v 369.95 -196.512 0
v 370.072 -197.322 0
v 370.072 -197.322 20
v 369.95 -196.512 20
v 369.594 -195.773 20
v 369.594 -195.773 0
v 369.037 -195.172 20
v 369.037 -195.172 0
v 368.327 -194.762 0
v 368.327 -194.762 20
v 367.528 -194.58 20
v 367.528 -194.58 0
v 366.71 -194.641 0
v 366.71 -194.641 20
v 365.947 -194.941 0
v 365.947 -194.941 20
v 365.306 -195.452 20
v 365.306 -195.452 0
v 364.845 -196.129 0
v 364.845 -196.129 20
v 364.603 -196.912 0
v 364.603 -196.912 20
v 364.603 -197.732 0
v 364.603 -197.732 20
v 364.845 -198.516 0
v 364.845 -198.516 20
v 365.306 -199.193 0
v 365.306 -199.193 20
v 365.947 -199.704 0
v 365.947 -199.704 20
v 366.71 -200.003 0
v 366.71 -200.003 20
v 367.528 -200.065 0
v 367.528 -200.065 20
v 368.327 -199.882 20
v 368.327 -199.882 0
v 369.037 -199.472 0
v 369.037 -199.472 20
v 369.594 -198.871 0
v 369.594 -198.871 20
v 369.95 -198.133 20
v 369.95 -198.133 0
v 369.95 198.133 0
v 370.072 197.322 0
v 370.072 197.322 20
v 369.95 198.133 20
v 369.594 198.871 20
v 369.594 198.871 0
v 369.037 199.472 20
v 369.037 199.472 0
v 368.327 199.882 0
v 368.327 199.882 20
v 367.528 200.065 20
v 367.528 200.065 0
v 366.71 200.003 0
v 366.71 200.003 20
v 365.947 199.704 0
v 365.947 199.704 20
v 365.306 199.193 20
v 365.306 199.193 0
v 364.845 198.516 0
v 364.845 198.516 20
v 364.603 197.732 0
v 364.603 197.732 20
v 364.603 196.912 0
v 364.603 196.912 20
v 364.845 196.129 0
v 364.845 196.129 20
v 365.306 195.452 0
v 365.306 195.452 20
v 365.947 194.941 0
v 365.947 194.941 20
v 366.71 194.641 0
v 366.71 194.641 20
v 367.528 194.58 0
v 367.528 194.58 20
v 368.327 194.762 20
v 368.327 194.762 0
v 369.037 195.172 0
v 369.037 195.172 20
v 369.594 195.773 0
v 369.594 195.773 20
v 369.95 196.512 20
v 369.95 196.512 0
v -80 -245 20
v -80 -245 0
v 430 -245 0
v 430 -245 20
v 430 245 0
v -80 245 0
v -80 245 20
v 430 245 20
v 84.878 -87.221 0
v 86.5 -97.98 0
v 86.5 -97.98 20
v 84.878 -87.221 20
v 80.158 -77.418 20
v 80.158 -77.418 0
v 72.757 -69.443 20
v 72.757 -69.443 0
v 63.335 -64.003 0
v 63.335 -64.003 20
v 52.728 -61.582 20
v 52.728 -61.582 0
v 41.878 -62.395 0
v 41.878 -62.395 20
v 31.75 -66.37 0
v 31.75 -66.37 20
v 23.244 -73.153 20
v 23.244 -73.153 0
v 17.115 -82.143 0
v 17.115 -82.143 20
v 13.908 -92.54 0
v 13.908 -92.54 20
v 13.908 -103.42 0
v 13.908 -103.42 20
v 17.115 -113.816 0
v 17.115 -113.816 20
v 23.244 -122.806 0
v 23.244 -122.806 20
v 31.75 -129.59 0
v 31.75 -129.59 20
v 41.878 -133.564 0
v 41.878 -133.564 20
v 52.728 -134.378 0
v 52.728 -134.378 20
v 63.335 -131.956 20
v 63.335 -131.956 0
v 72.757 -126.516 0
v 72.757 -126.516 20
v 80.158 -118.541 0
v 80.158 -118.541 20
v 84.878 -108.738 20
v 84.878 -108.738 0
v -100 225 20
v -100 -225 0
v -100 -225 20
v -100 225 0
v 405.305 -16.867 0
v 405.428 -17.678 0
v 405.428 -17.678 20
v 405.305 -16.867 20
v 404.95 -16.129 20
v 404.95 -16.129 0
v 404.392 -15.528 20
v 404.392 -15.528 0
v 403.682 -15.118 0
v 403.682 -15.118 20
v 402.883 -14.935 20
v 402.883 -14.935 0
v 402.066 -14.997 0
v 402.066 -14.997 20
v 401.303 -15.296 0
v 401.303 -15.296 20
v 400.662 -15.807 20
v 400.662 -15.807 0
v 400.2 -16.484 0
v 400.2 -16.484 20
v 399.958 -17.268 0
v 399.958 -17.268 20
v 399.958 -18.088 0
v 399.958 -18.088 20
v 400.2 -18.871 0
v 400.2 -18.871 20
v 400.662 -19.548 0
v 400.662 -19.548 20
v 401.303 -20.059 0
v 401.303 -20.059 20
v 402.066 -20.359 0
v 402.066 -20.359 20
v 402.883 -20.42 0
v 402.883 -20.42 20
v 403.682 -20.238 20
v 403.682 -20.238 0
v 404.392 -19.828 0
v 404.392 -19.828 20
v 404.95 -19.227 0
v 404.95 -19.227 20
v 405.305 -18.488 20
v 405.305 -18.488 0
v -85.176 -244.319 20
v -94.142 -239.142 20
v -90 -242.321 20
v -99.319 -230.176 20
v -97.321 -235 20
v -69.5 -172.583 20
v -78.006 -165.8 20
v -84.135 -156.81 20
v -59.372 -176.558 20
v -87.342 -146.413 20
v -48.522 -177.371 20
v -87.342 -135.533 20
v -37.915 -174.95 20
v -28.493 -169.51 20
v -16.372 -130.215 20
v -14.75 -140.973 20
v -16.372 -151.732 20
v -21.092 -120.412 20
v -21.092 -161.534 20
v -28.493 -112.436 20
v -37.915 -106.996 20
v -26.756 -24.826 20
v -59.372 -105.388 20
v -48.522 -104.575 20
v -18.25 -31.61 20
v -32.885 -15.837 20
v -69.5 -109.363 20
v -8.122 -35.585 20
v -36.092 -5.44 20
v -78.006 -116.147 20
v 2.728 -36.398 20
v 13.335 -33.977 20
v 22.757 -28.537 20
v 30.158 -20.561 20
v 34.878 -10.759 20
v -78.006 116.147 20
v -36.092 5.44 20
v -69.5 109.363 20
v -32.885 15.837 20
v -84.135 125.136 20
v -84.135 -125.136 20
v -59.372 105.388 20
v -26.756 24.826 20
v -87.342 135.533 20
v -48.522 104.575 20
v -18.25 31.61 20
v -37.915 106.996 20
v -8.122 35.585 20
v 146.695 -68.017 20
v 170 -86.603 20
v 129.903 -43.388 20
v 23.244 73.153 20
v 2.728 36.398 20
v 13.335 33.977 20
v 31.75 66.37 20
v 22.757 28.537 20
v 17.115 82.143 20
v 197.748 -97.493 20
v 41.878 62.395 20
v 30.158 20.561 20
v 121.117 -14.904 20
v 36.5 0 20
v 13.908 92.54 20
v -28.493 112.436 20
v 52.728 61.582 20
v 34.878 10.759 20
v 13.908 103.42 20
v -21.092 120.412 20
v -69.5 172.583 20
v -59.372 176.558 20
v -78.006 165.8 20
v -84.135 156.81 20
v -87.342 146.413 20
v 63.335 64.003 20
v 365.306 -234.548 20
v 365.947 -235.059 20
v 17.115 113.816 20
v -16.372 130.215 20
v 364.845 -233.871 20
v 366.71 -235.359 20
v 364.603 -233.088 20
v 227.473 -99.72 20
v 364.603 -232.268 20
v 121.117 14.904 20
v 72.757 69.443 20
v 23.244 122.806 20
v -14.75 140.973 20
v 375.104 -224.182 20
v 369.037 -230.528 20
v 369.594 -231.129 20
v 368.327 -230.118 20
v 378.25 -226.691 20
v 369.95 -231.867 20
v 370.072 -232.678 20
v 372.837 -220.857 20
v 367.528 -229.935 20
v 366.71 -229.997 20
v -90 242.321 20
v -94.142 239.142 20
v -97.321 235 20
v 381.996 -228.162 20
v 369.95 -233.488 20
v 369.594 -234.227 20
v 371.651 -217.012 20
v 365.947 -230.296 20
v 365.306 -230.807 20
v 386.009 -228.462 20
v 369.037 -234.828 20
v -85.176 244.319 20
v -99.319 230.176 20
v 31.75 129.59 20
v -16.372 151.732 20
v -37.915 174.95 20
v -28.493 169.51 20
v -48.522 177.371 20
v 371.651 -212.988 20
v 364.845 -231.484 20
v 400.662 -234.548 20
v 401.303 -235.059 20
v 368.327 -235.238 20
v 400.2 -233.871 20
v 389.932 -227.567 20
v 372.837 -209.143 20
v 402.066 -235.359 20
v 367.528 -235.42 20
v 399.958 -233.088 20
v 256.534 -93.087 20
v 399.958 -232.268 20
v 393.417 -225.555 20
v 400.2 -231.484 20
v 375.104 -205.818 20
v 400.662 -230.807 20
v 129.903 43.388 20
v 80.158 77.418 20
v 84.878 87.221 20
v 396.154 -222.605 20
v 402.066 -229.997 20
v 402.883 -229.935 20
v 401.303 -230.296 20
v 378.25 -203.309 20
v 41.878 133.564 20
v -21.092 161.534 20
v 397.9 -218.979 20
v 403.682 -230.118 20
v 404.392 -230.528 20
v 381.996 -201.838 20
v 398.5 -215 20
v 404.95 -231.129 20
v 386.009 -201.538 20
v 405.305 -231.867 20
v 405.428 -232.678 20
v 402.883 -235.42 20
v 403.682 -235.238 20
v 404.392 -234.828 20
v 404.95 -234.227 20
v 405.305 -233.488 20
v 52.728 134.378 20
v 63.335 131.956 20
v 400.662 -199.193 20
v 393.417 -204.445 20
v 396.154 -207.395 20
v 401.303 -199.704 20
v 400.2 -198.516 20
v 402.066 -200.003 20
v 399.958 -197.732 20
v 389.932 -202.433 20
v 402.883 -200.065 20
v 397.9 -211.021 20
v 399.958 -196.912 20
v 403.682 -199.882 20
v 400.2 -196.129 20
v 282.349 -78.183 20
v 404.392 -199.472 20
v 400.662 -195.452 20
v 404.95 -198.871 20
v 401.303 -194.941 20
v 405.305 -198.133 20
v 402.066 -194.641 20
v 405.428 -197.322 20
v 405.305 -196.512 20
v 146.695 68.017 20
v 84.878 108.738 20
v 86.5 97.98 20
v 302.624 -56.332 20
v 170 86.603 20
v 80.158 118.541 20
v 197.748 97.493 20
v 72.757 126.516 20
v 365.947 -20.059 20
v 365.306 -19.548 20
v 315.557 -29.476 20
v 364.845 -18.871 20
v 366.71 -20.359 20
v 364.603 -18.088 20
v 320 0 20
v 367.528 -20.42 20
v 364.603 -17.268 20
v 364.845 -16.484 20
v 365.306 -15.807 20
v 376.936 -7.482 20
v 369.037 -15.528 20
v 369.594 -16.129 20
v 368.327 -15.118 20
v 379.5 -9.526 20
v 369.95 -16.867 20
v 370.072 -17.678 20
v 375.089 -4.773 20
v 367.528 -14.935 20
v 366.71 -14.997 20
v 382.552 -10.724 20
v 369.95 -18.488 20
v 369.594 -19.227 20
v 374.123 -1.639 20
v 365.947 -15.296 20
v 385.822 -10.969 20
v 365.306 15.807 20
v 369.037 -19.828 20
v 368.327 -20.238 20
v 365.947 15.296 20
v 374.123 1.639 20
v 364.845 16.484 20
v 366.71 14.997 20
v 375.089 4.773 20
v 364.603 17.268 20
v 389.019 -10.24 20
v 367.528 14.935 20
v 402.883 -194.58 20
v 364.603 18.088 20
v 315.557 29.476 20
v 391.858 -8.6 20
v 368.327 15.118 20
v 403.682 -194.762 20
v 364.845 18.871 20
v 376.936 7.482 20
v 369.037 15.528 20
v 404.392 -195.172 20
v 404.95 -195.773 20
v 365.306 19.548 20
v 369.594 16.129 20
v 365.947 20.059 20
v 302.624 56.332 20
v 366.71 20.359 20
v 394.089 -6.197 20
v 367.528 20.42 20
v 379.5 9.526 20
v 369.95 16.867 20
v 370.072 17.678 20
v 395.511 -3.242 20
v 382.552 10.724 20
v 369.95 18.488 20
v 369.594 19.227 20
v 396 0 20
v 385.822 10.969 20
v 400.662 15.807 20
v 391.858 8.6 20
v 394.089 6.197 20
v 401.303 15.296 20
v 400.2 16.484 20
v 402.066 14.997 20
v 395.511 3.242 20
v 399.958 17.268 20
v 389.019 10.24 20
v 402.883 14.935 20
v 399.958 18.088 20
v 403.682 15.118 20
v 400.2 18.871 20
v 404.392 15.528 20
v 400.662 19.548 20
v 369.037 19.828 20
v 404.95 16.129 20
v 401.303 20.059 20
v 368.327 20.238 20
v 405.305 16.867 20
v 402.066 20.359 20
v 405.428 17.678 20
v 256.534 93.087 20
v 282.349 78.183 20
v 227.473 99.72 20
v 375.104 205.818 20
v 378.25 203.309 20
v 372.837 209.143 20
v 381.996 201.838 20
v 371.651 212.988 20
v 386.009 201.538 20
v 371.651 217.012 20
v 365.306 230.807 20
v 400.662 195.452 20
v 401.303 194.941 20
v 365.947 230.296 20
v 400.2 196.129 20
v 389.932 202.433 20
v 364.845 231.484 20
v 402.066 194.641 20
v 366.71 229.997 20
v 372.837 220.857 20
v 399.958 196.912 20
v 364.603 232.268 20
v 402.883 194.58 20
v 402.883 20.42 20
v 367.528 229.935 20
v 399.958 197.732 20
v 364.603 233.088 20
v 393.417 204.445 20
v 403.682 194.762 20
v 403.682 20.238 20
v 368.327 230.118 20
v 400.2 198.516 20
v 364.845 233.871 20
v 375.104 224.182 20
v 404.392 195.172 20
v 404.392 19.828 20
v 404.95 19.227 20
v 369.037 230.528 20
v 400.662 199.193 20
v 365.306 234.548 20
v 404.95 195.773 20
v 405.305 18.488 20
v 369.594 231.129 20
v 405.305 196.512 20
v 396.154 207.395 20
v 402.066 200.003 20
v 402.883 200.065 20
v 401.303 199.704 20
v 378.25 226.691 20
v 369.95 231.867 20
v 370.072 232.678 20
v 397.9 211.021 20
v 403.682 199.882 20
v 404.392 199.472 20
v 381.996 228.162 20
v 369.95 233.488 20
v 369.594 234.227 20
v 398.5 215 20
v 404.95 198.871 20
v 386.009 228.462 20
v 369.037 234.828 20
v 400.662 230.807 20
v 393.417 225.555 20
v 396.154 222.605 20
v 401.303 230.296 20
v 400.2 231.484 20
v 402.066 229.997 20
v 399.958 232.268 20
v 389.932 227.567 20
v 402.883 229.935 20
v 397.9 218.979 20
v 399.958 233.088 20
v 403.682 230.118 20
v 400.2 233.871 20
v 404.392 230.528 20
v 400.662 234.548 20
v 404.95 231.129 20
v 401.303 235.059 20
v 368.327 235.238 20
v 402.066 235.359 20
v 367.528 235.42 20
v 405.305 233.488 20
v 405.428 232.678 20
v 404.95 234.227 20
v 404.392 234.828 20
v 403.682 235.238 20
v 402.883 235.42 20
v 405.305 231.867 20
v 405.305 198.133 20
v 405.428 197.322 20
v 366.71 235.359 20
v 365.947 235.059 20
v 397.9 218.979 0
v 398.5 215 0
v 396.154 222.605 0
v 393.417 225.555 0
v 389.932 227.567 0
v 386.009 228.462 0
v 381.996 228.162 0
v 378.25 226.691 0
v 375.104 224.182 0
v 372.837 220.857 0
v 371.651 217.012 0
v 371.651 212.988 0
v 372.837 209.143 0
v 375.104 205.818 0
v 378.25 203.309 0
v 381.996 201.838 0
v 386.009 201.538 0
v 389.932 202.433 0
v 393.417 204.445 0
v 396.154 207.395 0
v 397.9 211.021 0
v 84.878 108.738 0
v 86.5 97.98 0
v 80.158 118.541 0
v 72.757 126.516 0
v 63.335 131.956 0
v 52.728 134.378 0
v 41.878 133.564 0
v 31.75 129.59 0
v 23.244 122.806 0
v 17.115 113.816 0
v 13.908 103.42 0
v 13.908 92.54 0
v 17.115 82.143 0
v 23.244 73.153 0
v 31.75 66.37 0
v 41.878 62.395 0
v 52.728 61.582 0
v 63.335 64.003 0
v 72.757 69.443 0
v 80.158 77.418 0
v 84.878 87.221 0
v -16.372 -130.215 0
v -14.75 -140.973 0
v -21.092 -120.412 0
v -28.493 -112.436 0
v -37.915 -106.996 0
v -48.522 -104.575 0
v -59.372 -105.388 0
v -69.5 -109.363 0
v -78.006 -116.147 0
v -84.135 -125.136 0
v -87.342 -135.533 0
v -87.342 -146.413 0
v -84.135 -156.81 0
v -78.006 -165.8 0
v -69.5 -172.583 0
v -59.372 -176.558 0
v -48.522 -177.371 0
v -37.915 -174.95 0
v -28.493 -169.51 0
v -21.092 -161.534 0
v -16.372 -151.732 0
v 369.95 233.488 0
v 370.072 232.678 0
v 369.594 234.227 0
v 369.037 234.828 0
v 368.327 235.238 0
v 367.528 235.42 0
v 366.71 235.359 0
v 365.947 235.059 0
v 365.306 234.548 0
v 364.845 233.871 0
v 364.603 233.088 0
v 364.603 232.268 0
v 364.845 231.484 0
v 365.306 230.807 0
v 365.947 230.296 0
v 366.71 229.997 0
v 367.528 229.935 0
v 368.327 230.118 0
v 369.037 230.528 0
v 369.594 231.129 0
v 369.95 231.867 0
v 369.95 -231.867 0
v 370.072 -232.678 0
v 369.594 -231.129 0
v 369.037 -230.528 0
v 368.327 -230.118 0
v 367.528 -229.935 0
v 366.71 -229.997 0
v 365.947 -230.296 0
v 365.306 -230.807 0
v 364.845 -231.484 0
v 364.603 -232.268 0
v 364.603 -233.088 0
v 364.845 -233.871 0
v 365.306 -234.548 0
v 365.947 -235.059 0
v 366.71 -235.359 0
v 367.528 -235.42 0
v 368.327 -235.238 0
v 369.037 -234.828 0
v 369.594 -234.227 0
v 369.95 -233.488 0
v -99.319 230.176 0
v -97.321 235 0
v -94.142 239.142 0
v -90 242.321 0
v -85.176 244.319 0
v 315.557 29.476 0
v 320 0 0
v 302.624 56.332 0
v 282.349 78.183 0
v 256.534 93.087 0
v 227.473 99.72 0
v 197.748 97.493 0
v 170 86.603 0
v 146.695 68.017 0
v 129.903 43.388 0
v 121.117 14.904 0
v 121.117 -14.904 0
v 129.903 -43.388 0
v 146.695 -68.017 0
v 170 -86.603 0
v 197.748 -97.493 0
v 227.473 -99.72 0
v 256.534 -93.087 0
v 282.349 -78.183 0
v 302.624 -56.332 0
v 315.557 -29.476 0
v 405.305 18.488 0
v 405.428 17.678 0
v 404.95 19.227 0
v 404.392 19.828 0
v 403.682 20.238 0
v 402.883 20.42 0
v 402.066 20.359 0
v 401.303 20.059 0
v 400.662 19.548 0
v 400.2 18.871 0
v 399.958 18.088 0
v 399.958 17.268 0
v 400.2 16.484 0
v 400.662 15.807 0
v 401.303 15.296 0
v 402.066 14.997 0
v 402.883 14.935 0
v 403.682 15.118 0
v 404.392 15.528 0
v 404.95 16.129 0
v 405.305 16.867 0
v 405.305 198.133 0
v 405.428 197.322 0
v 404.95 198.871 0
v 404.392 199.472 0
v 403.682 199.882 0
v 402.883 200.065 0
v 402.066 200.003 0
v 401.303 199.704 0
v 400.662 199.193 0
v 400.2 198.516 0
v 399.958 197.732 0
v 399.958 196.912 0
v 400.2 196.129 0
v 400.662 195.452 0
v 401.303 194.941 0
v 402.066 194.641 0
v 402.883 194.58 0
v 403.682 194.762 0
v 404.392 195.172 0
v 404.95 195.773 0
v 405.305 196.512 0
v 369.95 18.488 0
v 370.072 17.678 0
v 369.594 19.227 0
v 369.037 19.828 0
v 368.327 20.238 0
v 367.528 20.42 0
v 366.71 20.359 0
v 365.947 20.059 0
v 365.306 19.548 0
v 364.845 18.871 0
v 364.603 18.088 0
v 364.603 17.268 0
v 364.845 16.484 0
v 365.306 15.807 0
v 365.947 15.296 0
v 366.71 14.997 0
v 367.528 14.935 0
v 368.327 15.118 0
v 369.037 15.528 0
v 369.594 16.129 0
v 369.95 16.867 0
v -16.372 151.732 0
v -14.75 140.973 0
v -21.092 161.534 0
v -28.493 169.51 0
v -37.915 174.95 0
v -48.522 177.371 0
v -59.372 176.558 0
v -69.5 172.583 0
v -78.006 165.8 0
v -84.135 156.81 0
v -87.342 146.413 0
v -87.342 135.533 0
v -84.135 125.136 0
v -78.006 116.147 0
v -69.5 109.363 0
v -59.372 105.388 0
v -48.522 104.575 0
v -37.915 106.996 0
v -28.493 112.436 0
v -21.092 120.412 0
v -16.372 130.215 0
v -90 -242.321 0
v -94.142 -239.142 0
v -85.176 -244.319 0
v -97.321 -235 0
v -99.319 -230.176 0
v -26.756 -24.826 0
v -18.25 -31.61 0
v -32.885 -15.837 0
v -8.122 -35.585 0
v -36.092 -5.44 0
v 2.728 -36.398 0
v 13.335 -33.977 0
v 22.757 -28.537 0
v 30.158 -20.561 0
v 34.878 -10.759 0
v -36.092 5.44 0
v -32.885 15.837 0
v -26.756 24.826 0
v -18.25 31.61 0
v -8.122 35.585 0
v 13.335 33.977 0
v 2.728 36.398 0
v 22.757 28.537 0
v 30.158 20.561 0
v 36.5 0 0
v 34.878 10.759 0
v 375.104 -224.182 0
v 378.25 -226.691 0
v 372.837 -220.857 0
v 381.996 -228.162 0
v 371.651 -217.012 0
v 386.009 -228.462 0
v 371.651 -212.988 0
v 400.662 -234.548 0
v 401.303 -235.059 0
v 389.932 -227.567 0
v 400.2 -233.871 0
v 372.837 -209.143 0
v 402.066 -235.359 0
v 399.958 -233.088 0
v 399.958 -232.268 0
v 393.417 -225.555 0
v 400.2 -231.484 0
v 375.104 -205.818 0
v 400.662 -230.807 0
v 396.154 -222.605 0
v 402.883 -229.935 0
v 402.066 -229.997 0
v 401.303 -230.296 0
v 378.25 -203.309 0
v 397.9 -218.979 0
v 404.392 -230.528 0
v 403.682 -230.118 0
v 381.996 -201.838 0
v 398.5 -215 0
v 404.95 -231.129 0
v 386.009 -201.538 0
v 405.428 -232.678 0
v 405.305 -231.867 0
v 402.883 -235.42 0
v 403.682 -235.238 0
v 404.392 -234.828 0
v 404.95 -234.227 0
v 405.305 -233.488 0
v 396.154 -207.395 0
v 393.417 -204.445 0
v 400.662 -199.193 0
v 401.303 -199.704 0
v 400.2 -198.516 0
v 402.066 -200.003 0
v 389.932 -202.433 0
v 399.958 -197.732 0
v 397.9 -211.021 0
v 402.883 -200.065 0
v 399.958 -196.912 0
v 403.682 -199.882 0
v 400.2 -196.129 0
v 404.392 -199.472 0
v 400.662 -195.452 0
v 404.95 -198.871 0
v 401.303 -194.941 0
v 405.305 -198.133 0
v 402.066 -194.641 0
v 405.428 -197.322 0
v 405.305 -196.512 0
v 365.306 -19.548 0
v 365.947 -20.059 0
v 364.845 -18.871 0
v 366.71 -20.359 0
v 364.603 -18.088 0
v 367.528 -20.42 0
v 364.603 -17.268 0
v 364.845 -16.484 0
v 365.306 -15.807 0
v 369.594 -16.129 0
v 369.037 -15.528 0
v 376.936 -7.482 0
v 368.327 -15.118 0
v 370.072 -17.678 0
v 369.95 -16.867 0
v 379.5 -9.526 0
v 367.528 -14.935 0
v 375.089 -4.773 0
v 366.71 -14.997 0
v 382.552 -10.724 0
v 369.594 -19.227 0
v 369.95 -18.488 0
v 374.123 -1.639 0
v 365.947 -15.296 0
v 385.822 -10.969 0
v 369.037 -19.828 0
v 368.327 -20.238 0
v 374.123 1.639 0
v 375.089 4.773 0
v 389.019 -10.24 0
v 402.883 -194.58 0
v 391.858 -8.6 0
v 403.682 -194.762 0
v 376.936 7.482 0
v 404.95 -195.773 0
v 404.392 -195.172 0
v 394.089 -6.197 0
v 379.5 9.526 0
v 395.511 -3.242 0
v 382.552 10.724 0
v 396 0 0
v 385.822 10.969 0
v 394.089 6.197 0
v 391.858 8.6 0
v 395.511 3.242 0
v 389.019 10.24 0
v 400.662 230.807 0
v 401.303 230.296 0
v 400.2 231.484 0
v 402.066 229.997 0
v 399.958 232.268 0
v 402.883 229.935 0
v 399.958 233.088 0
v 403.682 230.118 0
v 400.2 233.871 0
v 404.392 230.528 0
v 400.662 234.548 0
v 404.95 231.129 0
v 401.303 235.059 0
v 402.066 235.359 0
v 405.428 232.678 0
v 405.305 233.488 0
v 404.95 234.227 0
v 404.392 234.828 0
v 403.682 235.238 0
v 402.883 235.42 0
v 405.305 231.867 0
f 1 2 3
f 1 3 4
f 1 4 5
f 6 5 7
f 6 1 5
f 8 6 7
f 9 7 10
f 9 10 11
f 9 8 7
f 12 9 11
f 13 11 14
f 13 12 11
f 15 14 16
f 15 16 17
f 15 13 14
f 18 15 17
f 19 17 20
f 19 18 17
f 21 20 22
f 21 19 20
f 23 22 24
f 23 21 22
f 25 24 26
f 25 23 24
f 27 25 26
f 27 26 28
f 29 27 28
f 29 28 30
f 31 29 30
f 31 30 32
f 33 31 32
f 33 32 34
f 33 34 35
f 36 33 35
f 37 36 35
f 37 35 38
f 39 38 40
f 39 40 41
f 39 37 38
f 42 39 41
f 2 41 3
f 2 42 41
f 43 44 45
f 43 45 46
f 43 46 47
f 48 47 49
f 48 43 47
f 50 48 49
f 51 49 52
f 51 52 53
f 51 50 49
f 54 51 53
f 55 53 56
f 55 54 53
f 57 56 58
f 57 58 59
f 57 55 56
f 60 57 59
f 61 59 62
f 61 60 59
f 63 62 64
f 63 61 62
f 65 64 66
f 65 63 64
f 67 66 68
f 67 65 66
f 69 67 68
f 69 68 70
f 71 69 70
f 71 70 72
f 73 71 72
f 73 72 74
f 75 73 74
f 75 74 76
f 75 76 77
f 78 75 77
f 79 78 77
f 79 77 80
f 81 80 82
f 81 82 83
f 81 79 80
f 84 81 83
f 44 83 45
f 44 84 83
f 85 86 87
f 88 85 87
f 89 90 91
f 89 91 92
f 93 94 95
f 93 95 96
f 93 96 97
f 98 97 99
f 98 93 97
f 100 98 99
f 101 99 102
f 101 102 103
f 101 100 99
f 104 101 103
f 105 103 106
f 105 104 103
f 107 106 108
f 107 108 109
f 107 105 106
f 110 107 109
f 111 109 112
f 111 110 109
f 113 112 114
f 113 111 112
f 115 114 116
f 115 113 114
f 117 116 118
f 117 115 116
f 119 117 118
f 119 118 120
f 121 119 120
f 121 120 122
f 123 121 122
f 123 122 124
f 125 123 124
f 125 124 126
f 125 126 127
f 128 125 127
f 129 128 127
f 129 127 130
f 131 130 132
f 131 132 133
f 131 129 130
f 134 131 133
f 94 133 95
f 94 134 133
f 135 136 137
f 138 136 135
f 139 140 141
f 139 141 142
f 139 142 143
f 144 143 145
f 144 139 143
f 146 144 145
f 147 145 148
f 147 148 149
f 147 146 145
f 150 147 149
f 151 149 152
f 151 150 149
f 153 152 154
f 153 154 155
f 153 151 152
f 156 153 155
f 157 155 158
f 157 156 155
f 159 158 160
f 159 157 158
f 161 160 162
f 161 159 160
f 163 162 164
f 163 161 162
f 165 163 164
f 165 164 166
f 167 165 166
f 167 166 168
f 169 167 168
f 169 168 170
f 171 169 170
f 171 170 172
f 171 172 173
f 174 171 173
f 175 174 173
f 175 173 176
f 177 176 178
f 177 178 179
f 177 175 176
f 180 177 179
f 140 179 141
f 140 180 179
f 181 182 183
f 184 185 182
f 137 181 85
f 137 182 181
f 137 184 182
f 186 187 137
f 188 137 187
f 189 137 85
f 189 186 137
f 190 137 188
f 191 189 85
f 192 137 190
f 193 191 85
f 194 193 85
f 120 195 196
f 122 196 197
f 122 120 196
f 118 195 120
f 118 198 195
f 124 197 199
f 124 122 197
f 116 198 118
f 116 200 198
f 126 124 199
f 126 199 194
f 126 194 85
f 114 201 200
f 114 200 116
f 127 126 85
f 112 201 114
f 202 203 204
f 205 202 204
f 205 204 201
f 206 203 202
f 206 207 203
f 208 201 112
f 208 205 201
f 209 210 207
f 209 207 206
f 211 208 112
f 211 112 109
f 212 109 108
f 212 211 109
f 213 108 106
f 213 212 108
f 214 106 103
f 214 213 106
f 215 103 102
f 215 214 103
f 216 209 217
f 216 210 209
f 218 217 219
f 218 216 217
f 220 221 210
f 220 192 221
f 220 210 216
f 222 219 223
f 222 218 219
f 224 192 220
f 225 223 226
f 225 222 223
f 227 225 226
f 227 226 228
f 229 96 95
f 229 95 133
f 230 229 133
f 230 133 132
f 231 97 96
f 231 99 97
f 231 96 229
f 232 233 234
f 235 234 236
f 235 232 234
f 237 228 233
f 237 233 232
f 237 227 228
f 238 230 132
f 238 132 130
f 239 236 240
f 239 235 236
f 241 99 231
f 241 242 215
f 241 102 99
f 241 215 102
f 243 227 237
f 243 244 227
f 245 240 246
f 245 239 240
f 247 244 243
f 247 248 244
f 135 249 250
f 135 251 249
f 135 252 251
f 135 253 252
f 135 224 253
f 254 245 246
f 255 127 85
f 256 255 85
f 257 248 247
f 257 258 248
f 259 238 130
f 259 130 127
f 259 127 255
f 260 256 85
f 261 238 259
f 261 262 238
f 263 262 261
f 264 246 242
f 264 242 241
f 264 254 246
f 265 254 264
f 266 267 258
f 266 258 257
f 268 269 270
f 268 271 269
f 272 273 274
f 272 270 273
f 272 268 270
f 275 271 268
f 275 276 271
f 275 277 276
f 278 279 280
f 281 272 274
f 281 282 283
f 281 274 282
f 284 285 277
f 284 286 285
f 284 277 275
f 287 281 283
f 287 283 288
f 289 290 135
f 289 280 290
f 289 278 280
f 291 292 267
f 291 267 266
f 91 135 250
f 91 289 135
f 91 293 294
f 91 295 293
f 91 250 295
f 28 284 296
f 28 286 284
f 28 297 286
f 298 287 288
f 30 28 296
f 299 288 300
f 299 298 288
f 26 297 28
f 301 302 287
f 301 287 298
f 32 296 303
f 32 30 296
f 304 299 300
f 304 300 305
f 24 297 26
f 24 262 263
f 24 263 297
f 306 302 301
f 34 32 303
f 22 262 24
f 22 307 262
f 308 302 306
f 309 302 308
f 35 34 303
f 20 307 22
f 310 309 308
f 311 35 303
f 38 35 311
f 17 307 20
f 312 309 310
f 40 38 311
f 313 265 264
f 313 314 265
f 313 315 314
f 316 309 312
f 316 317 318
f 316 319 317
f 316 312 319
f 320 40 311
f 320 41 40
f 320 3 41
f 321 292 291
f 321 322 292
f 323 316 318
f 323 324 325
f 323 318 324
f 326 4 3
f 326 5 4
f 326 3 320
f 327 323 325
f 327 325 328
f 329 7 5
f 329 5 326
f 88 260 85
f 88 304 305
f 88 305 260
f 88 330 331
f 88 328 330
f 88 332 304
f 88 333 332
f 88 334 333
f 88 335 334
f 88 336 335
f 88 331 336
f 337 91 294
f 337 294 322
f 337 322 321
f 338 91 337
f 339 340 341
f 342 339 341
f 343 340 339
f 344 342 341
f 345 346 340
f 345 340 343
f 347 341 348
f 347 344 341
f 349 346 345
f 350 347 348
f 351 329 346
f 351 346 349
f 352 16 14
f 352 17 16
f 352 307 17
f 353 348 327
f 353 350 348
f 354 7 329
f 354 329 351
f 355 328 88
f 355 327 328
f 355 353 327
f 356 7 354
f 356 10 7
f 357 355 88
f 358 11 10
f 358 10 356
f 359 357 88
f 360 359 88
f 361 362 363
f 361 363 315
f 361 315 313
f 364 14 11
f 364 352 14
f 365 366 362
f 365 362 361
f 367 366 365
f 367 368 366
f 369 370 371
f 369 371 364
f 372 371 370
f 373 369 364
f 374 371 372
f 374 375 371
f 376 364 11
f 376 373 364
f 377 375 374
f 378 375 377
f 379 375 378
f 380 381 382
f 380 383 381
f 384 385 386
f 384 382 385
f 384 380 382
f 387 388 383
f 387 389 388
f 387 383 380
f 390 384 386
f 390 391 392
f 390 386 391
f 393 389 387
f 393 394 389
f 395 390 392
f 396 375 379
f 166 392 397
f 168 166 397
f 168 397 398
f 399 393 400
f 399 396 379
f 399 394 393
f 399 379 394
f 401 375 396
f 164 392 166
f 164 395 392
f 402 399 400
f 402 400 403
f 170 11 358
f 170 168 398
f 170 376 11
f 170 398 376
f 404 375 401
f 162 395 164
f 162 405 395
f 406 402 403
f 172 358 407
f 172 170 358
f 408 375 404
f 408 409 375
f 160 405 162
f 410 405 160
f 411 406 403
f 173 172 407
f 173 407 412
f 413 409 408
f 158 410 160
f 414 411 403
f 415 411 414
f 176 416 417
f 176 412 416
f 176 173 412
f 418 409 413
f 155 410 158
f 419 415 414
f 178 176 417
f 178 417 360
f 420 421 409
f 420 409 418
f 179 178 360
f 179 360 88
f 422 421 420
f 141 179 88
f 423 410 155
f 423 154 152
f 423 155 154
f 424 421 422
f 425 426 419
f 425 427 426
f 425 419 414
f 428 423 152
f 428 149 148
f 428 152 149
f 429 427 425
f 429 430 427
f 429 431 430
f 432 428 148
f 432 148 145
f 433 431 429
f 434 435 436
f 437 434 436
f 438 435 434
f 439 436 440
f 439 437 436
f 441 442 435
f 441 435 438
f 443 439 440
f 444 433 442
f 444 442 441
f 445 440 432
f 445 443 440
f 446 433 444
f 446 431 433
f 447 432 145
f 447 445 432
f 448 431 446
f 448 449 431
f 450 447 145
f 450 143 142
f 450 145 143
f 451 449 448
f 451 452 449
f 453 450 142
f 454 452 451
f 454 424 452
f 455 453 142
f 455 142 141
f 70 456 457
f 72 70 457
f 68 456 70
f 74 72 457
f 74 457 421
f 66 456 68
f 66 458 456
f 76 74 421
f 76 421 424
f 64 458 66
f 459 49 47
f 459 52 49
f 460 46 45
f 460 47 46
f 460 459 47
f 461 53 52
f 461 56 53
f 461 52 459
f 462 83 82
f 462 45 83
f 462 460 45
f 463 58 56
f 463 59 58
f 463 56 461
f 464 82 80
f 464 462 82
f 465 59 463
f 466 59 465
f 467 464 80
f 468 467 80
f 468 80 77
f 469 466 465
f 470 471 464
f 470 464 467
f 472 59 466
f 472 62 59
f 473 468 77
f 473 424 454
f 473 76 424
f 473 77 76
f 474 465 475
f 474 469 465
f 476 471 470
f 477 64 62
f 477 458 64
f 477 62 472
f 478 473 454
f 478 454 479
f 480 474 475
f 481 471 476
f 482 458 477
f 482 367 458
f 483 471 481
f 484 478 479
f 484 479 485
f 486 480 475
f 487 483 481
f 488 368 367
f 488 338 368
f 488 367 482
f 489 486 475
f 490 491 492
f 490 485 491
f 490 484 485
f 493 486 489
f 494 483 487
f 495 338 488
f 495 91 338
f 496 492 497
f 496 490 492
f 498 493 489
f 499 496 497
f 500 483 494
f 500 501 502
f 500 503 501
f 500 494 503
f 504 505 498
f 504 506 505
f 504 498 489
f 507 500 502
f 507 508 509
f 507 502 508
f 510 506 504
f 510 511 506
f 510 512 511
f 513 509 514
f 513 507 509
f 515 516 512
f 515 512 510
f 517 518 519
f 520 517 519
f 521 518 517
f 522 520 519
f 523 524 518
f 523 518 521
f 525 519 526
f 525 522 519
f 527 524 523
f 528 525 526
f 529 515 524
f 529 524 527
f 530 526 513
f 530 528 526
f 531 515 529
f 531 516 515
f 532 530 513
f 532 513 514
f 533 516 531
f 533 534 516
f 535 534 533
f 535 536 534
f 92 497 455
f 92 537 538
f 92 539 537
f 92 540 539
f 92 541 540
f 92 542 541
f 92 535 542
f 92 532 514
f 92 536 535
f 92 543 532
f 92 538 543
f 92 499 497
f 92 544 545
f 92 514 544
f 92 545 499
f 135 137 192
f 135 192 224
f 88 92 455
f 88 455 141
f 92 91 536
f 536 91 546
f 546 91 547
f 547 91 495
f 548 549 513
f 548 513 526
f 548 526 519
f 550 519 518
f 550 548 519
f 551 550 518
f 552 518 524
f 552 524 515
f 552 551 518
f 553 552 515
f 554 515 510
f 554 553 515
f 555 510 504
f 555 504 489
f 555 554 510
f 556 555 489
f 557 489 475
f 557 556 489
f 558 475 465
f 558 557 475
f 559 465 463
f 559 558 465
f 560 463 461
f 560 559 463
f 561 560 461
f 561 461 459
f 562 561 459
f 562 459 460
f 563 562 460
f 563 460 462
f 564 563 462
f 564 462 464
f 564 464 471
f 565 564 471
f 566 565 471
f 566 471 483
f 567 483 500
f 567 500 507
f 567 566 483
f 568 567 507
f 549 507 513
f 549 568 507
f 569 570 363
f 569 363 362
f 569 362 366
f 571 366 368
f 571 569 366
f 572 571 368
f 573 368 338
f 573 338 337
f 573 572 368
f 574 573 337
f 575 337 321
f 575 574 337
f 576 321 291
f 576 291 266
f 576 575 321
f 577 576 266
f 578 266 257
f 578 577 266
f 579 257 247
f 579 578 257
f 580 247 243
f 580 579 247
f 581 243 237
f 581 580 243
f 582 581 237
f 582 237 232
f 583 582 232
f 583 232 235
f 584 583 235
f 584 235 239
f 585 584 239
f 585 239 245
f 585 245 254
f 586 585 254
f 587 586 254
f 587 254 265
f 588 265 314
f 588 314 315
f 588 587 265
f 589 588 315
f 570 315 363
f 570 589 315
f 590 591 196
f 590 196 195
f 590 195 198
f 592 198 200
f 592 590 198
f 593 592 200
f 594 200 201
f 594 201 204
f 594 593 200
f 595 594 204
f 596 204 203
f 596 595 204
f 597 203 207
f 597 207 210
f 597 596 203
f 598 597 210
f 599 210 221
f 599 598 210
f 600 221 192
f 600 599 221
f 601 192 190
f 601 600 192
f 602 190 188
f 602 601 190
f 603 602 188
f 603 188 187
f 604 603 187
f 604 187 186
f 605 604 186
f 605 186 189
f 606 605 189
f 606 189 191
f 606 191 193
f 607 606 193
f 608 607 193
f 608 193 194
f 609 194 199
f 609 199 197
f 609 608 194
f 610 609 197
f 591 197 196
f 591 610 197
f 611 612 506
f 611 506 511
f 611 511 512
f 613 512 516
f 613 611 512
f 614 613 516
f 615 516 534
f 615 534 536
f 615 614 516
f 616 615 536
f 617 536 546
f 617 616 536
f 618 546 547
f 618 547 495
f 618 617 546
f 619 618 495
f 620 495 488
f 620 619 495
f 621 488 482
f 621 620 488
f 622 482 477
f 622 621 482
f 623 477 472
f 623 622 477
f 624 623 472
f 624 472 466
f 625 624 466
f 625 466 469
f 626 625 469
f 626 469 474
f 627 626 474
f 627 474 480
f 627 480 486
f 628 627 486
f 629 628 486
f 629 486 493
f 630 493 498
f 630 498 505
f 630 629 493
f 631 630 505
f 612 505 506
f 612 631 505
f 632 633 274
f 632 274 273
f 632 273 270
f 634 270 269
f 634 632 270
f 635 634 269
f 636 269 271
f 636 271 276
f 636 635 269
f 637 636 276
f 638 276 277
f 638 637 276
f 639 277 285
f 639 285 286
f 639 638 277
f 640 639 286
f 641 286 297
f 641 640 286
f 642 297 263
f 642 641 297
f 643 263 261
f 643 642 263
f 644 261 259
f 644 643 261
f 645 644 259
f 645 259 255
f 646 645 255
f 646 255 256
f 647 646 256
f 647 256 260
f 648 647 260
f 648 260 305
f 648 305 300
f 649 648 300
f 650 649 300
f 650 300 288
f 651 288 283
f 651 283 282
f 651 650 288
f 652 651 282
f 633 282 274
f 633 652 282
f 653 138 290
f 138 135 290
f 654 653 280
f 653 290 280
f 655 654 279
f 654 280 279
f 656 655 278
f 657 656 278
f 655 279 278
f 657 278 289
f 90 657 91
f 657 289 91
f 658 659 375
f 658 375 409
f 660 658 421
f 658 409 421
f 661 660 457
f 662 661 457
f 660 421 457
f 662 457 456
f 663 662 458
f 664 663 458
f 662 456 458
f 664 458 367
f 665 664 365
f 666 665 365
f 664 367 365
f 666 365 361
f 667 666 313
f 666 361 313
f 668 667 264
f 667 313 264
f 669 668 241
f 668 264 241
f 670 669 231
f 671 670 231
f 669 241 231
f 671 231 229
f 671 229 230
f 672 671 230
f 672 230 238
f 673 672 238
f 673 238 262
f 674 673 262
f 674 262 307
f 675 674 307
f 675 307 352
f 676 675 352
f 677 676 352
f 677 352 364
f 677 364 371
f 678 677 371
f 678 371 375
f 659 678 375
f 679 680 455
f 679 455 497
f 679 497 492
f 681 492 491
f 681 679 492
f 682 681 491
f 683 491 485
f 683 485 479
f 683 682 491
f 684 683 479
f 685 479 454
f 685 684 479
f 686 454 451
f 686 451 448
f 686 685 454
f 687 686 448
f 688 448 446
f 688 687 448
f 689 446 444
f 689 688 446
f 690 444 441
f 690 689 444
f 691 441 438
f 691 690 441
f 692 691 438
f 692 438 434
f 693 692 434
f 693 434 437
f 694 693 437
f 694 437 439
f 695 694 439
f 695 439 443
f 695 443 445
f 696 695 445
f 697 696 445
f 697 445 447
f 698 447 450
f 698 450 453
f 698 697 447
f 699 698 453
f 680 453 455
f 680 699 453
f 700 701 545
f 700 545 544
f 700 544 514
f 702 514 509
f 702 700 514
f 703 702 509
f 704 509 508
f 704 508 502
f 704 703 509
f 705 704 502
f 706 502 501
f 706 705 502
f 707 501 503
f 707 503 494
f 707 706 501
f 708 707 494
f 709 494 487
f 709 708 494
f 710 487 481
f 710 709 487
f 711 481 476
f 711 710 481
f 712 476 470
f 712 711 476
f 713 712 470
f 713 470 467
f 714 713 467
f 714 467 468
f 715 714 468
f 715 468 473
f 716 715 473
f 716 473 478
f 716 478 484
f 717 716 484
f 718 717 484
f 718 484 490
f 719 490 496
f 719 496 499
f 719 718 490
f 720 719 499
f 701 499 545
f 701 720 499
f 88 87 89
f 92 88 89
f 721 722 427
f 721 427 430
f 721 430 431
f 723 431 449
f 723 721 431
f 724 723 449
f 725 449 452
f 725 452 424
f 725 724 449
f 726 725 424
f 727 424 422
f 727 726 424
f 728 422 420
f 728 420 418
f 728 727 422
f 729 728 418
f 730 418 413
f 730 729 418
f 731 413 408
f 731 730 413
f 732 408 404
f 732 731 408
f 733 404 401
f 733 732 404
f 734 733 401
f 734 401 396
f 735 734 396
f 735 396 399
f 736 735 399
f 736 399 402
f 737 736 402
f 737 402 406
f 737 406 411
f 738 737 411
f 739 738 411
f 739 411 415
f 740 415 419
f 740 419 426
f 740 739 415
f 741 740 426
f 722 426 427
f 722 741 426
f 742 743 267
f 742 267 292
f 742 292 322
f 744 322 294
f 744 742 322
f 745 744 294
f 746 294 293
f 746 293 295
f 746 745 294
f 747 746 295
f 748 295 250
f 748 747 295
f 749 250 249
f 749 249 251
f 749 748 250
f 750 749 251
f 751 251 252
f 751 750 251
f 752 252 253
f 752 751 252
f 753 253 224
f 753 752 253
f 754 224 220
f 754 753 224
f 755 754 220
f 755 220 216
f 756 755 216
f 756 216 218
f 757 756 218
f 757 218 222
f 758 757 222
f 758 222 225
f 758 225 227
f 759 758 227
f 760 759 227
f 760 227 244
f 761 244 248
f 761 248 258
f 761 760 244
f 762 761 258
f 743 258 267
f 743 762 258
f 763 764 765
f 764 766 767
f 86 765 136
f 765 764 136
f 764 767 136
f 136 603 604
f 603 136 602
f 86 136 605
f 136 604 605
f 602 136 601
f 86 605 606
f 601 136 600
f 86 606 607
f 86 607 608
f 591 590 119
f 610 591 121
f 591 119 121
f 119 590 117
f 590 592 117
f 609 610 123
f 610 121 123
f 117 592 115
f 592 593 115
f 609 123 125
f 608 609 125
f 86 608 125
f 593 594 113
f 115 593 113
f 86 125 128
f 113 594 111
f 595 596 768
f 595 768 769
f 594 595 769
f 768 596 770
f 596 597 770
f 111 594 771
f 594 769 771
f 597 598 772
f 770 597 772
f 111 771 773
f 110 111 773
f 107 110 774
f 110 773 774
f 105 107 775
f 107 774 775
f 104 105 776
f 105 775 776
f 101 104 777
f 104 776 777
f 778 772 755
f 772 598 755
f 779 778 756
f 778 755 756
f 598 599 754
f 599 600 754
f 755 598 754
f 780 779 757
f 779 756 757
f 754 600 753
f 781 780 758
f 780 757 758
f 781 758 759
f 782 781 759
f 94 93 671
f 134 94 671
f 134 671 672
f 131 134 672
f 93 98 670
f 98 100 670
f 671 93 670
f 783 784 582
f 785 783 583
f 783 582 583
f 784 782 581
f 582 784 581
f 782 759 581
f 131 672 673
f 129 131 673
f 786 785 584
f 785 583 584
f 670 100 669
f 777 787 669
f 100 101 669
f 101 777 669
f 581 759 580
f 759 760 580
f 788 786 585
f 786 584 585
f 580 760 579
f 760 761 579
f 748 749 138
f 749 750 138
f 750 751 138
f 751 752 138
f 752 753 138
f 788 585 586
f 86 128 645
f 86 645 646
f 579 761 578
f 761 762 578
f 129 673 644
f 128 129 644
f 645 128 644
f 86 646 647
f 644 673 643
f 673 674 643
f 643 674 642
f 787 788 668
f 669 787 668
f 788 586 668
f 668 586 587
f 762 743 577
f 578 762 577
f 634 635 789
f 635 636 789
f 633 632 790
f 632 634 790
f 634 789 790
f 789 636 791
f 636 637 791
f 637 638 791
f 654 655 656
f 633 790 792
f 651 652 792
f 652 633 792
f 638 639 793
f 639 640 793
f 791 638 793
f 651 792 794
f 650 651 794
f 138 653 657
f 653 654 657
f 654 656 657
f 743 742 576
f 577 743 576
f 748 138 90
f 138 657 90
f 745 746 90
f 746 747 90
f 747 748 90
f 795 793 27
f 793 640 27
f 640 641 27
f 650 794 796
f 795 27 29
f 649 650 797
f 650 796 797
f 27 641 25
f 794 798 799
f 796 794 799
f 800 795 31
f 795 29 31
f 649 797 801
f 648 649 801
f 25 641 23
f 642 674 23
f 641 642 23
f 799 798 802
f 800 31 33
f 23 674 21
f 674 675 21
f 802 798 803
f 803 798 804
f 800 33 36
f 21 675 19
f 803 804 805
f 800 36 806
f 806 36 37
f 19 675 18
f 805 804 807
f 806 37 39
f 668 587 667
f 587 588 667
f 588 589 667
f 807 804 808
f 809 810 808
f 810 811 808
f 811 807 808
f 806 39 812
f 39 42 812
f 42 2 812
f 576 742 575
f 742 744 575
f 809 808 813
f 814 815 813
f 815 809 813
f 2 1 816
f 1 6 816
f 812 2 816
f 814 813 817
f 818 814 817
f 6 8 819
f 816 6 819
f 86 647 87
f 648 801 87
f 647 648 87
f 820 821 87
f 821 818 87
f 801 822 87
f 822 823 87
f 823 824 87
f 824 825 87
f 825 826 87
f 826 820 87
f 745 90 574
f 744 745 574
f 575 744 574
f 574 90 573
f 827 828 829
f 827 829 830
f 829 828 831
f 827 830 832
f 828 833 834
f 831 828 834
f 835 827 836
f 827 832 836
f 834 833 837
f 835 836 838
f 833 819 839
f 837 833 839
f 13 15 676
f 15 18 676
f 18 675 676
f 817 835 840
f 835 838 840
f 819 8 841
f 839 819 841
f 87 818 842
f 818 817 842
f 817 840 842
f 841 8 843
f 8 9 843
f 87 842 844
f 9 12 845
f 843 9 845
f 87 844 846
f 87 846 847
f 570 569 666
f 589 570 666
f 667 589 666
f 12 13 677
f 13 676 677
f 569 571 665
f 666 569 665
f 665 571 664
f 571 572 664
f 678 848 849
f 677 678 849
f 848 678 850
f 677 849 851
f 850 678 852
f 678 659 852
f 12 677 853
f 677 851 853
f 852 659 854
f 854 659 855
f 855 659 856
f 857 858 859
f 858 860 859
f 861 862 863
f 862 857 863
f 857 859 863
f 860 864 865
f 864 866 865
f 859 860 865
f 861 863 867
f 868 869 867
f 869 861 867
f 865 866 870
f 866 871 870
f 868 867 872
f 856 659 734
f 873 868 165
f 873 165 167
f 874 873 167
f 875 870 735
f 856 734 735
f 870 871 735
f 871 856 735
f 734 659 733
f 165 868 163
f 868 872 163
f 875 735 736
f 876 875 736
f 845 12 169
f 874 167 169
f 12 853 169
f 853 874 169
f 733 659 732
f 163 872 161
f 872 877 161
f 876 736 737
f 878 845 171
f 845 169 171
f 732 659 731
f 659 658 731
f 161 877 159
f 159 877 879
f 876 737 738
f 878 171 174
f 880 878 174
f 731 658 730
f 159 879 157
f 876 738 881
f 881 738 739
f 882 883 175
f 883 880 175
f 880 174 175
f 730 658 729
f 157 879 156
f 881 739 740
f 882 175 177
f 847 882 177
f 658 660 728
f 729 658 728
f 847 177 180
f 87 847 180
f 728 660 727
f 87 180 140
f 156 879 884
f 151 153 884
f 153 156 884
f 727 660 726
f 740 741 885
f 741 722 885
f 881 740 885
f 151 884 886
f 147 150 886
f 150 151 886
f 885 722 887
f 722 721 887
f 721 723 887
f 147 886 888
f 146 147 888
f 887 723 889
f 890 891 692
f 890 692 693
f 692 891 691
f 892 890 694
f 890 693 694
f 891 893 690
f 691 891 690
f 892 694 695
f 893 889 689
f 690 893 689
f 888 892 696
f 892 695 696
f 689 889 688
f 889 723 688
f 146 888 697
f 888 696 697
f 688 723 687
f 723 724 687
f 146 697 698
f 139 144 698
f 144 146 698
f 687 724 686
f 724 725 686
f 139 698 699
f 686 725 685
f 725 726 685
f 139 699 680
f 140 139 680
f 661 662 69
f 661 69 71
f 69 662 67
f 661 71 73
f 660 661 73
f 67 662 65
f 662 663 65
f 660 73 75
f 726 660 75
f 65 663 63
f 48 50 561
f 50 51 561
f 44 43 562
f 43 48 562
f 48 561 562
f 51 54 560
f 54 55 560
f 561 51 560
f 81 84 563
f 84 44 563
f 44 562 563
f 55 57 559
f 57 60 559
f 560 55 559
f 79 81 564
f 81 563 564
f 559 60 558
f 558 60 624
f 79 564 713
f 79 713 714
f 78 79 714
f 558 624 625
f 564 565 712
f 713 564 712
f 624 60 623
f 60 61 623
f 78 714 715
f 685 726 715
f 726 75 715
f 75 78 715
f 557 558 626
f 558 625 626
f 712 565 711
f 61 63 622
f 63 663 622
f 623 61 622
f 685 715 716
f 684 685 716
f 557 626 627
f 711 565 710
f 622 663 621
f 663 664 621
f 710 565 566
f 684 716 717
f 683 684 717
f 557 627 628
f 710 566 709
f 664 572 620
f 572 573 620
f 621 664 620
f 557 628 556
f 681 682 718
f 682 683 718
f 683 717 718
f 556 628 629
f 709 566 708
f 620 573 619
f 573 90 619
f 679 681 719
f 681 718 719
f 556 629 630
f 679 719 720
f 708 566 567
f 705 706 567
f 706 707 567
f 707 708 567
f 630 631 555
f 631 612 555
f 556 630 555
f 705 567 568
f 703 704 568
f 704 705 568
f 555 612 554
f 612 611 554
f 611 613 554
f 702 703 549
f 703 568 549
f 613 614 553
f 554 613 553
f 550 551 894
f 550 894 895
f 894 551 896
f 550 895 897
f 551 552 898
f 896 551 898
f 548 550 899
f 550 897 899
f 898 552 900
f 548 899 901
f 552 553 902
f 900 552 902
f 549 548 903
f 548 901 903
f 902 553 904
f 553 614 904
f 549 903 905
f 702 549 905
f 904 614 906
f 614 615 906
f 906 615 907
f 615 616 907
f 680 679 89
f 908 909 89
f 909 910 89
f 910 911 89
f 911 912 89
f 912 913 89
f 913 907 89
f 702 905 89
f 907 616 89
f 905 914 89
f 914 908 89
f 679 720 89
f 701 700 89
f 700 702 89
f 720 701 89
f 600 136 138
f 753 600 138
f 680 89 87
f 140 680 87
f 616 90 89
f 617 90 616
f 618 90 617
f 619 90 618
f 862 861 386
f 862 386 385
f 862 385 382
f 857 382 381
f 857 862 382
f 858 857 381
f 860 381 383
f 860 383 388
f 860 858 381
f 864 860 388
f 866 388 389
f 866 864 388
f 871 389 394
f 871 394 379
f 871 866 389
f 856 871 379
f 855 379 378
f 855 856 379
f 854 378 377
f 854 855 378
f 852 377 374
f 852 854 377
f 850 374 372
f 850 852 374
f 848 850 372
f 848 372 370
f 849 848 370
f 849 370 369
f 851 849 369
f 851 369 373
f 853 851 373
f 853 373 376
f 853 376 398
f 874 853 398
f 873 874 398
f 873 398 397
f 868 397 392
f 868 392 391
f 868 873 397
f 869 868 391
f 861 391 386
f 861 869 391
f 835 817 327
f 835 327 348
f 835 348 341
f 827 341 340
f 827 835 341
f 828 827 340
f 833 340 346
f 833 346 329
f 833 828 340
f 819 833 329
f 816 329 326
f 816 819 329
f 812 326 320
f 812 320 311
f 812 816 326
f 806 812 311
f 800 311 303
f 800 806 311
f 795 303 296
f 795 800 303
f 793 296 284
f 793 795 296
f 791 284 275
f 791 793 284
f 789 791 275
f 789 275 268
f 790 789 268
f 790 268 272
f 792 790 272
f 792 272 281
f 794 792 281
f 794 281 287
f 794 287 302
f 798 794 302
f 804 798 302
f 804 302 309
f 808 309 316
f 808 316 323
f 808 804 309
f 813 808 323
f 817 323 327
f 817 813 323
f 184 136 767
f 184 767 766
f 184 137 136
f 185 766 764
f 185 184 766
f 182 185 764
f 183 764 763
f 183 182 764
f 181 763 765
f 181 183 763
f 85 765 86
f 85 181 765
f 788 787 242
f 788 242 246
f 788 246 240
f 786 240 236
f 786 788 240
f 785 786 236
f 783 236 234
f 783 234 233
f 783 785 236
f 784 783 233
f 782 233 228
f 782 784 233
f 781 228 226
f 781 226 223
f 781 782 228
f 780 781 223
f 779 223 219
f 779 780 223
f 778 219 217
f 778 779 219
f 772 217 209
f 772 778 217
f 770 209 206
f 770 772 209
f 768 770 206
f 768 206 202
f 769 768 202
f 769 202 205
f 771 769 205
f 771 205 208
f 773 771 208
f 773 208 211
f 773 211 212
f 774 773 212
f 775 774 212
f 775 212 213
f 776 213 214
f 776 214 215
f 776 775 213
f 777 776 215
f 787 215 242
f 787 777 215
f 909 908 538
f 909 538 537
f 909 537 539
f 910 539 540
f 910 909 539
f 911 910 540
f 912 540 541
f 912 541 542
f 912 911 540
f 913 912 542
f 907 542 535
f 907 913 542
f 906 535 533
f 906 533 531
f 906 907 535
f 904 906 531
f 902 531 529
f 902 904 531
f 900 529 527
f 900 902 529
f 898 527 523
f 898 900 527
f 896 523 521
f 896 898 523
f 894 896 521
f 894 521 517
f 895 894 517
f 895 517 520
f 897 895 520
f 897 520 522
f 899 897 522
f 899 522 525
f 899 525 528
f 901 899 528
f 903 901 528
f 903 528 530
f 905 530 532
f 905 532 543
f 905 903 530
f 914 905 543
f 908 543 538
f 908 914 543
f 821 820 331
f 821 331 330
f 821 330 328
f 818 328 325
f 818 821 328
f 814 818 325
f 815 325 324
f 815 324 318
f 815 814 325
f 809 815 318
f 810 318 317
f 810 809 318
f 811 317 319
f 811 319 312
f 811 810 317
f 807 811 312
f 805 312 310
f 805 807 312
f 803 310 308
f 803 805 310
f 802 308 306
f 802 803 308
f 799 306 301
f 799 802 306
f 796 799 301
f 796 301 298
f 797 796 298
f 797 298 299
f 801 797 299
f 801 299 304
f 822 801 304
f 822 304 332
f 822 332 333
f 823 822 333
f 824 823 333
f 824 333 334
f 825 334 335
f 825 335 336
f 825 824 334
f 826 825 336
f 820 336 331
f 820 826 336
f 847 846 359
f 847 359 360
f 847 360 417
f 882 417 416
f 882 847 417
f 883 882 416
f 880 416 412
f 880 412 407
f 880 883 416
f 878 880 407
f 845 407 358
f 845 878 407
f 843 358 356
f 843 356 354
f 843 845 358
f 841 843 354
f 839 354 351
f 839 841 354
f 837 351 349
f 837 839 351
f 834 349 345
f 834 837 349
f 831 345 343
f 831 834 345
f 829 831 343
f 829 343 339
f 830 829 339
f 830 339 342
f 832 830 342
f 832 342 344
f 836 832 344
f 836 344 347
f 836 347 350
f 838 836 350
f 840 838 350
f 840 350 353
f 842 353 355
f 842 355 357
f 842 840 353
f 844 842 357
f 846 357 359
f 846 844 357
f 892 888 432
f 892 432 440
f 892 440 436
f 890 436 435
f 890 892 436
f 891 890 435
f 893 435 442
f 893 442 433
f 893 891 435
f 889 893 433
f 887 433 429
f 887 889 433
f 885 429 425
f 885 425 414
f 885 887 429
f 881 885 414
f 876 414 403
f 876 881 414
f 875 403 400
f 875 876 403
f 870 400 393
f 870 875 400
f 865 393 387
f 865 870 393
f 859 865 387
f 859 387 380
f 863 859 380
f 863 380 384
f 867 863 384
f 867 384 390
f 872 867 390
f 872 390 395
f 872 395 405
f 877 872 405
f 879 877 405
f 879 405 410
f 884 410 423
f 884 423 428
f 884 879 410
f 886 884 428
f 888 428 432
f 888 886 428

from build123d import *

# Parameters (mm, degrees)
SKETCH_1_W          = 530
SKETCH_1_H          = 490
SKETCH_1_R          = 36.5
SKETCH_1_R_2        = 2.75
SKETCH_1_R_3        = 13.5
SKETCH_1_R_4        = 11
EXTRUDE_1_DEPTH     = 20
FILLET_1_R          = 20
SKETCH_2_R          = 100
CUT_EXTRUDE_1_DEPTH = 496.302937605


with BuildPart() as part:
    # Эскиз1 → Бобышка-Вытянуть1 (new body)
    with BuildSketch(Plane.XY):
        with Locations((165, 0)):
            Rectangle(SKETCH_1_W, SKETCH_1_H)
        with Locations((-51.249933939, -140.973204089)):
            Circle(SKETCH_1_R, mode=Mode.SUBTRACT)
        with Locations((50, -97.979589711)):
            Circle(SKETCH_1_R, mode=Mode.SUBTRACT)
        with Locations((367.32233047, -232.67766953)):
            Circle(SKETCH_1_R_2, mode=Mode.SUBTRACT)
        with Locations((385, -215)):
            Circle(SKETCH_1_R_3, mode=Mode.SUBTRACT)
        with Locations((402.67766953, -232.67766953)):
            Circle(SKETCH_1_R_2, mode=Mode.SUBTRACT)
        with Locations((367.32233047, -197.32233047)):
            Circle(SKETCH_1_R_2, mode=Mode.SUBTRACT)
        with Locations((402.67766953, -197.32233047)):
            Circle(SKETCH_1_R_2, mode=Mode.SUBTRACT)
        with Locations((367.32233047, -17.67766953)):
            Circle(SKETCH_1_R_2, mode=Mode.SUBTRACT)
        with Locations((402.67766953, -17.67766953)):
            Circle(SKETCH_1_R_2, mode=Mode.SUBTRACT)
        Circle(SKETCH_1_R, mode=Mode.SUBTRACT)
        with Locations((50, 97.979589711)):
            Circle(SKETCH_1_R, mode=Mode.SUBTRACT)
        with Locations((-51.249933939, 140.973204089)):
            Circle(SKETCH_1_R, mode=Mode.SUBTRACT)
        with Locations((385, 0)):
            Circle(SKETCH_1_R_4, mode=Mode.SUBTRACT)
        with Locations((367.32233047, 17.67766953)):
            Circle(SKETCH_1_R_2, mode=Mode.SUBTRACT)
        with Locations((402.67766953, 17.67766953)):
            Circle(SKETCH_1_R_2, mode=Mode.SUBTRACT)
        with Locations((367.32233047, 197.32233047)):
            Circle(SKETCH_1_R_2, mode=Mode.SUBTRACT)
        with Locations((402.67766953, 197.32233047)):
            Circle(SKETCH_1_R_2, mode=Mode.SUBTRACT)
        with Locations((385, 215)):
            Circle(SKETCH_1_R_3, mode=Mode.SUBTRACT)
        with Locations((367.32233047, 232.67766953)):
            Circle(SKETCH_1_R_2, mode=Mode.SUBTRACT)
        with Locations((402.67766953, 232.67766953)):
            Circle(SKETCH_1_R_2, mode=Mode.SUBTRACT)
    extrude(amount=EXTRUDE_1_DEPTH)

    # Скругление1
    fillet_1_edges = [part.edges().sort_by_distance(p)[0] for p in [
        (-100, 245, 10),
        (-100, -245, 10),
    ]]
    fillet(fillet_1_edges, radius=FILLET_1_R)

    # Эскиз2 → Вырез-Вытянуть1 (cut, through all)
    with BuildSketch(Plane.XY.offset(20)):
        with Locations((220, 0)):
            Circle(SKETCH_2_R)
    extrude(amount=-CUT_EXTRUDE_1_DEPTH, mode=Mode.SUBTRACT)


solid = part.part
